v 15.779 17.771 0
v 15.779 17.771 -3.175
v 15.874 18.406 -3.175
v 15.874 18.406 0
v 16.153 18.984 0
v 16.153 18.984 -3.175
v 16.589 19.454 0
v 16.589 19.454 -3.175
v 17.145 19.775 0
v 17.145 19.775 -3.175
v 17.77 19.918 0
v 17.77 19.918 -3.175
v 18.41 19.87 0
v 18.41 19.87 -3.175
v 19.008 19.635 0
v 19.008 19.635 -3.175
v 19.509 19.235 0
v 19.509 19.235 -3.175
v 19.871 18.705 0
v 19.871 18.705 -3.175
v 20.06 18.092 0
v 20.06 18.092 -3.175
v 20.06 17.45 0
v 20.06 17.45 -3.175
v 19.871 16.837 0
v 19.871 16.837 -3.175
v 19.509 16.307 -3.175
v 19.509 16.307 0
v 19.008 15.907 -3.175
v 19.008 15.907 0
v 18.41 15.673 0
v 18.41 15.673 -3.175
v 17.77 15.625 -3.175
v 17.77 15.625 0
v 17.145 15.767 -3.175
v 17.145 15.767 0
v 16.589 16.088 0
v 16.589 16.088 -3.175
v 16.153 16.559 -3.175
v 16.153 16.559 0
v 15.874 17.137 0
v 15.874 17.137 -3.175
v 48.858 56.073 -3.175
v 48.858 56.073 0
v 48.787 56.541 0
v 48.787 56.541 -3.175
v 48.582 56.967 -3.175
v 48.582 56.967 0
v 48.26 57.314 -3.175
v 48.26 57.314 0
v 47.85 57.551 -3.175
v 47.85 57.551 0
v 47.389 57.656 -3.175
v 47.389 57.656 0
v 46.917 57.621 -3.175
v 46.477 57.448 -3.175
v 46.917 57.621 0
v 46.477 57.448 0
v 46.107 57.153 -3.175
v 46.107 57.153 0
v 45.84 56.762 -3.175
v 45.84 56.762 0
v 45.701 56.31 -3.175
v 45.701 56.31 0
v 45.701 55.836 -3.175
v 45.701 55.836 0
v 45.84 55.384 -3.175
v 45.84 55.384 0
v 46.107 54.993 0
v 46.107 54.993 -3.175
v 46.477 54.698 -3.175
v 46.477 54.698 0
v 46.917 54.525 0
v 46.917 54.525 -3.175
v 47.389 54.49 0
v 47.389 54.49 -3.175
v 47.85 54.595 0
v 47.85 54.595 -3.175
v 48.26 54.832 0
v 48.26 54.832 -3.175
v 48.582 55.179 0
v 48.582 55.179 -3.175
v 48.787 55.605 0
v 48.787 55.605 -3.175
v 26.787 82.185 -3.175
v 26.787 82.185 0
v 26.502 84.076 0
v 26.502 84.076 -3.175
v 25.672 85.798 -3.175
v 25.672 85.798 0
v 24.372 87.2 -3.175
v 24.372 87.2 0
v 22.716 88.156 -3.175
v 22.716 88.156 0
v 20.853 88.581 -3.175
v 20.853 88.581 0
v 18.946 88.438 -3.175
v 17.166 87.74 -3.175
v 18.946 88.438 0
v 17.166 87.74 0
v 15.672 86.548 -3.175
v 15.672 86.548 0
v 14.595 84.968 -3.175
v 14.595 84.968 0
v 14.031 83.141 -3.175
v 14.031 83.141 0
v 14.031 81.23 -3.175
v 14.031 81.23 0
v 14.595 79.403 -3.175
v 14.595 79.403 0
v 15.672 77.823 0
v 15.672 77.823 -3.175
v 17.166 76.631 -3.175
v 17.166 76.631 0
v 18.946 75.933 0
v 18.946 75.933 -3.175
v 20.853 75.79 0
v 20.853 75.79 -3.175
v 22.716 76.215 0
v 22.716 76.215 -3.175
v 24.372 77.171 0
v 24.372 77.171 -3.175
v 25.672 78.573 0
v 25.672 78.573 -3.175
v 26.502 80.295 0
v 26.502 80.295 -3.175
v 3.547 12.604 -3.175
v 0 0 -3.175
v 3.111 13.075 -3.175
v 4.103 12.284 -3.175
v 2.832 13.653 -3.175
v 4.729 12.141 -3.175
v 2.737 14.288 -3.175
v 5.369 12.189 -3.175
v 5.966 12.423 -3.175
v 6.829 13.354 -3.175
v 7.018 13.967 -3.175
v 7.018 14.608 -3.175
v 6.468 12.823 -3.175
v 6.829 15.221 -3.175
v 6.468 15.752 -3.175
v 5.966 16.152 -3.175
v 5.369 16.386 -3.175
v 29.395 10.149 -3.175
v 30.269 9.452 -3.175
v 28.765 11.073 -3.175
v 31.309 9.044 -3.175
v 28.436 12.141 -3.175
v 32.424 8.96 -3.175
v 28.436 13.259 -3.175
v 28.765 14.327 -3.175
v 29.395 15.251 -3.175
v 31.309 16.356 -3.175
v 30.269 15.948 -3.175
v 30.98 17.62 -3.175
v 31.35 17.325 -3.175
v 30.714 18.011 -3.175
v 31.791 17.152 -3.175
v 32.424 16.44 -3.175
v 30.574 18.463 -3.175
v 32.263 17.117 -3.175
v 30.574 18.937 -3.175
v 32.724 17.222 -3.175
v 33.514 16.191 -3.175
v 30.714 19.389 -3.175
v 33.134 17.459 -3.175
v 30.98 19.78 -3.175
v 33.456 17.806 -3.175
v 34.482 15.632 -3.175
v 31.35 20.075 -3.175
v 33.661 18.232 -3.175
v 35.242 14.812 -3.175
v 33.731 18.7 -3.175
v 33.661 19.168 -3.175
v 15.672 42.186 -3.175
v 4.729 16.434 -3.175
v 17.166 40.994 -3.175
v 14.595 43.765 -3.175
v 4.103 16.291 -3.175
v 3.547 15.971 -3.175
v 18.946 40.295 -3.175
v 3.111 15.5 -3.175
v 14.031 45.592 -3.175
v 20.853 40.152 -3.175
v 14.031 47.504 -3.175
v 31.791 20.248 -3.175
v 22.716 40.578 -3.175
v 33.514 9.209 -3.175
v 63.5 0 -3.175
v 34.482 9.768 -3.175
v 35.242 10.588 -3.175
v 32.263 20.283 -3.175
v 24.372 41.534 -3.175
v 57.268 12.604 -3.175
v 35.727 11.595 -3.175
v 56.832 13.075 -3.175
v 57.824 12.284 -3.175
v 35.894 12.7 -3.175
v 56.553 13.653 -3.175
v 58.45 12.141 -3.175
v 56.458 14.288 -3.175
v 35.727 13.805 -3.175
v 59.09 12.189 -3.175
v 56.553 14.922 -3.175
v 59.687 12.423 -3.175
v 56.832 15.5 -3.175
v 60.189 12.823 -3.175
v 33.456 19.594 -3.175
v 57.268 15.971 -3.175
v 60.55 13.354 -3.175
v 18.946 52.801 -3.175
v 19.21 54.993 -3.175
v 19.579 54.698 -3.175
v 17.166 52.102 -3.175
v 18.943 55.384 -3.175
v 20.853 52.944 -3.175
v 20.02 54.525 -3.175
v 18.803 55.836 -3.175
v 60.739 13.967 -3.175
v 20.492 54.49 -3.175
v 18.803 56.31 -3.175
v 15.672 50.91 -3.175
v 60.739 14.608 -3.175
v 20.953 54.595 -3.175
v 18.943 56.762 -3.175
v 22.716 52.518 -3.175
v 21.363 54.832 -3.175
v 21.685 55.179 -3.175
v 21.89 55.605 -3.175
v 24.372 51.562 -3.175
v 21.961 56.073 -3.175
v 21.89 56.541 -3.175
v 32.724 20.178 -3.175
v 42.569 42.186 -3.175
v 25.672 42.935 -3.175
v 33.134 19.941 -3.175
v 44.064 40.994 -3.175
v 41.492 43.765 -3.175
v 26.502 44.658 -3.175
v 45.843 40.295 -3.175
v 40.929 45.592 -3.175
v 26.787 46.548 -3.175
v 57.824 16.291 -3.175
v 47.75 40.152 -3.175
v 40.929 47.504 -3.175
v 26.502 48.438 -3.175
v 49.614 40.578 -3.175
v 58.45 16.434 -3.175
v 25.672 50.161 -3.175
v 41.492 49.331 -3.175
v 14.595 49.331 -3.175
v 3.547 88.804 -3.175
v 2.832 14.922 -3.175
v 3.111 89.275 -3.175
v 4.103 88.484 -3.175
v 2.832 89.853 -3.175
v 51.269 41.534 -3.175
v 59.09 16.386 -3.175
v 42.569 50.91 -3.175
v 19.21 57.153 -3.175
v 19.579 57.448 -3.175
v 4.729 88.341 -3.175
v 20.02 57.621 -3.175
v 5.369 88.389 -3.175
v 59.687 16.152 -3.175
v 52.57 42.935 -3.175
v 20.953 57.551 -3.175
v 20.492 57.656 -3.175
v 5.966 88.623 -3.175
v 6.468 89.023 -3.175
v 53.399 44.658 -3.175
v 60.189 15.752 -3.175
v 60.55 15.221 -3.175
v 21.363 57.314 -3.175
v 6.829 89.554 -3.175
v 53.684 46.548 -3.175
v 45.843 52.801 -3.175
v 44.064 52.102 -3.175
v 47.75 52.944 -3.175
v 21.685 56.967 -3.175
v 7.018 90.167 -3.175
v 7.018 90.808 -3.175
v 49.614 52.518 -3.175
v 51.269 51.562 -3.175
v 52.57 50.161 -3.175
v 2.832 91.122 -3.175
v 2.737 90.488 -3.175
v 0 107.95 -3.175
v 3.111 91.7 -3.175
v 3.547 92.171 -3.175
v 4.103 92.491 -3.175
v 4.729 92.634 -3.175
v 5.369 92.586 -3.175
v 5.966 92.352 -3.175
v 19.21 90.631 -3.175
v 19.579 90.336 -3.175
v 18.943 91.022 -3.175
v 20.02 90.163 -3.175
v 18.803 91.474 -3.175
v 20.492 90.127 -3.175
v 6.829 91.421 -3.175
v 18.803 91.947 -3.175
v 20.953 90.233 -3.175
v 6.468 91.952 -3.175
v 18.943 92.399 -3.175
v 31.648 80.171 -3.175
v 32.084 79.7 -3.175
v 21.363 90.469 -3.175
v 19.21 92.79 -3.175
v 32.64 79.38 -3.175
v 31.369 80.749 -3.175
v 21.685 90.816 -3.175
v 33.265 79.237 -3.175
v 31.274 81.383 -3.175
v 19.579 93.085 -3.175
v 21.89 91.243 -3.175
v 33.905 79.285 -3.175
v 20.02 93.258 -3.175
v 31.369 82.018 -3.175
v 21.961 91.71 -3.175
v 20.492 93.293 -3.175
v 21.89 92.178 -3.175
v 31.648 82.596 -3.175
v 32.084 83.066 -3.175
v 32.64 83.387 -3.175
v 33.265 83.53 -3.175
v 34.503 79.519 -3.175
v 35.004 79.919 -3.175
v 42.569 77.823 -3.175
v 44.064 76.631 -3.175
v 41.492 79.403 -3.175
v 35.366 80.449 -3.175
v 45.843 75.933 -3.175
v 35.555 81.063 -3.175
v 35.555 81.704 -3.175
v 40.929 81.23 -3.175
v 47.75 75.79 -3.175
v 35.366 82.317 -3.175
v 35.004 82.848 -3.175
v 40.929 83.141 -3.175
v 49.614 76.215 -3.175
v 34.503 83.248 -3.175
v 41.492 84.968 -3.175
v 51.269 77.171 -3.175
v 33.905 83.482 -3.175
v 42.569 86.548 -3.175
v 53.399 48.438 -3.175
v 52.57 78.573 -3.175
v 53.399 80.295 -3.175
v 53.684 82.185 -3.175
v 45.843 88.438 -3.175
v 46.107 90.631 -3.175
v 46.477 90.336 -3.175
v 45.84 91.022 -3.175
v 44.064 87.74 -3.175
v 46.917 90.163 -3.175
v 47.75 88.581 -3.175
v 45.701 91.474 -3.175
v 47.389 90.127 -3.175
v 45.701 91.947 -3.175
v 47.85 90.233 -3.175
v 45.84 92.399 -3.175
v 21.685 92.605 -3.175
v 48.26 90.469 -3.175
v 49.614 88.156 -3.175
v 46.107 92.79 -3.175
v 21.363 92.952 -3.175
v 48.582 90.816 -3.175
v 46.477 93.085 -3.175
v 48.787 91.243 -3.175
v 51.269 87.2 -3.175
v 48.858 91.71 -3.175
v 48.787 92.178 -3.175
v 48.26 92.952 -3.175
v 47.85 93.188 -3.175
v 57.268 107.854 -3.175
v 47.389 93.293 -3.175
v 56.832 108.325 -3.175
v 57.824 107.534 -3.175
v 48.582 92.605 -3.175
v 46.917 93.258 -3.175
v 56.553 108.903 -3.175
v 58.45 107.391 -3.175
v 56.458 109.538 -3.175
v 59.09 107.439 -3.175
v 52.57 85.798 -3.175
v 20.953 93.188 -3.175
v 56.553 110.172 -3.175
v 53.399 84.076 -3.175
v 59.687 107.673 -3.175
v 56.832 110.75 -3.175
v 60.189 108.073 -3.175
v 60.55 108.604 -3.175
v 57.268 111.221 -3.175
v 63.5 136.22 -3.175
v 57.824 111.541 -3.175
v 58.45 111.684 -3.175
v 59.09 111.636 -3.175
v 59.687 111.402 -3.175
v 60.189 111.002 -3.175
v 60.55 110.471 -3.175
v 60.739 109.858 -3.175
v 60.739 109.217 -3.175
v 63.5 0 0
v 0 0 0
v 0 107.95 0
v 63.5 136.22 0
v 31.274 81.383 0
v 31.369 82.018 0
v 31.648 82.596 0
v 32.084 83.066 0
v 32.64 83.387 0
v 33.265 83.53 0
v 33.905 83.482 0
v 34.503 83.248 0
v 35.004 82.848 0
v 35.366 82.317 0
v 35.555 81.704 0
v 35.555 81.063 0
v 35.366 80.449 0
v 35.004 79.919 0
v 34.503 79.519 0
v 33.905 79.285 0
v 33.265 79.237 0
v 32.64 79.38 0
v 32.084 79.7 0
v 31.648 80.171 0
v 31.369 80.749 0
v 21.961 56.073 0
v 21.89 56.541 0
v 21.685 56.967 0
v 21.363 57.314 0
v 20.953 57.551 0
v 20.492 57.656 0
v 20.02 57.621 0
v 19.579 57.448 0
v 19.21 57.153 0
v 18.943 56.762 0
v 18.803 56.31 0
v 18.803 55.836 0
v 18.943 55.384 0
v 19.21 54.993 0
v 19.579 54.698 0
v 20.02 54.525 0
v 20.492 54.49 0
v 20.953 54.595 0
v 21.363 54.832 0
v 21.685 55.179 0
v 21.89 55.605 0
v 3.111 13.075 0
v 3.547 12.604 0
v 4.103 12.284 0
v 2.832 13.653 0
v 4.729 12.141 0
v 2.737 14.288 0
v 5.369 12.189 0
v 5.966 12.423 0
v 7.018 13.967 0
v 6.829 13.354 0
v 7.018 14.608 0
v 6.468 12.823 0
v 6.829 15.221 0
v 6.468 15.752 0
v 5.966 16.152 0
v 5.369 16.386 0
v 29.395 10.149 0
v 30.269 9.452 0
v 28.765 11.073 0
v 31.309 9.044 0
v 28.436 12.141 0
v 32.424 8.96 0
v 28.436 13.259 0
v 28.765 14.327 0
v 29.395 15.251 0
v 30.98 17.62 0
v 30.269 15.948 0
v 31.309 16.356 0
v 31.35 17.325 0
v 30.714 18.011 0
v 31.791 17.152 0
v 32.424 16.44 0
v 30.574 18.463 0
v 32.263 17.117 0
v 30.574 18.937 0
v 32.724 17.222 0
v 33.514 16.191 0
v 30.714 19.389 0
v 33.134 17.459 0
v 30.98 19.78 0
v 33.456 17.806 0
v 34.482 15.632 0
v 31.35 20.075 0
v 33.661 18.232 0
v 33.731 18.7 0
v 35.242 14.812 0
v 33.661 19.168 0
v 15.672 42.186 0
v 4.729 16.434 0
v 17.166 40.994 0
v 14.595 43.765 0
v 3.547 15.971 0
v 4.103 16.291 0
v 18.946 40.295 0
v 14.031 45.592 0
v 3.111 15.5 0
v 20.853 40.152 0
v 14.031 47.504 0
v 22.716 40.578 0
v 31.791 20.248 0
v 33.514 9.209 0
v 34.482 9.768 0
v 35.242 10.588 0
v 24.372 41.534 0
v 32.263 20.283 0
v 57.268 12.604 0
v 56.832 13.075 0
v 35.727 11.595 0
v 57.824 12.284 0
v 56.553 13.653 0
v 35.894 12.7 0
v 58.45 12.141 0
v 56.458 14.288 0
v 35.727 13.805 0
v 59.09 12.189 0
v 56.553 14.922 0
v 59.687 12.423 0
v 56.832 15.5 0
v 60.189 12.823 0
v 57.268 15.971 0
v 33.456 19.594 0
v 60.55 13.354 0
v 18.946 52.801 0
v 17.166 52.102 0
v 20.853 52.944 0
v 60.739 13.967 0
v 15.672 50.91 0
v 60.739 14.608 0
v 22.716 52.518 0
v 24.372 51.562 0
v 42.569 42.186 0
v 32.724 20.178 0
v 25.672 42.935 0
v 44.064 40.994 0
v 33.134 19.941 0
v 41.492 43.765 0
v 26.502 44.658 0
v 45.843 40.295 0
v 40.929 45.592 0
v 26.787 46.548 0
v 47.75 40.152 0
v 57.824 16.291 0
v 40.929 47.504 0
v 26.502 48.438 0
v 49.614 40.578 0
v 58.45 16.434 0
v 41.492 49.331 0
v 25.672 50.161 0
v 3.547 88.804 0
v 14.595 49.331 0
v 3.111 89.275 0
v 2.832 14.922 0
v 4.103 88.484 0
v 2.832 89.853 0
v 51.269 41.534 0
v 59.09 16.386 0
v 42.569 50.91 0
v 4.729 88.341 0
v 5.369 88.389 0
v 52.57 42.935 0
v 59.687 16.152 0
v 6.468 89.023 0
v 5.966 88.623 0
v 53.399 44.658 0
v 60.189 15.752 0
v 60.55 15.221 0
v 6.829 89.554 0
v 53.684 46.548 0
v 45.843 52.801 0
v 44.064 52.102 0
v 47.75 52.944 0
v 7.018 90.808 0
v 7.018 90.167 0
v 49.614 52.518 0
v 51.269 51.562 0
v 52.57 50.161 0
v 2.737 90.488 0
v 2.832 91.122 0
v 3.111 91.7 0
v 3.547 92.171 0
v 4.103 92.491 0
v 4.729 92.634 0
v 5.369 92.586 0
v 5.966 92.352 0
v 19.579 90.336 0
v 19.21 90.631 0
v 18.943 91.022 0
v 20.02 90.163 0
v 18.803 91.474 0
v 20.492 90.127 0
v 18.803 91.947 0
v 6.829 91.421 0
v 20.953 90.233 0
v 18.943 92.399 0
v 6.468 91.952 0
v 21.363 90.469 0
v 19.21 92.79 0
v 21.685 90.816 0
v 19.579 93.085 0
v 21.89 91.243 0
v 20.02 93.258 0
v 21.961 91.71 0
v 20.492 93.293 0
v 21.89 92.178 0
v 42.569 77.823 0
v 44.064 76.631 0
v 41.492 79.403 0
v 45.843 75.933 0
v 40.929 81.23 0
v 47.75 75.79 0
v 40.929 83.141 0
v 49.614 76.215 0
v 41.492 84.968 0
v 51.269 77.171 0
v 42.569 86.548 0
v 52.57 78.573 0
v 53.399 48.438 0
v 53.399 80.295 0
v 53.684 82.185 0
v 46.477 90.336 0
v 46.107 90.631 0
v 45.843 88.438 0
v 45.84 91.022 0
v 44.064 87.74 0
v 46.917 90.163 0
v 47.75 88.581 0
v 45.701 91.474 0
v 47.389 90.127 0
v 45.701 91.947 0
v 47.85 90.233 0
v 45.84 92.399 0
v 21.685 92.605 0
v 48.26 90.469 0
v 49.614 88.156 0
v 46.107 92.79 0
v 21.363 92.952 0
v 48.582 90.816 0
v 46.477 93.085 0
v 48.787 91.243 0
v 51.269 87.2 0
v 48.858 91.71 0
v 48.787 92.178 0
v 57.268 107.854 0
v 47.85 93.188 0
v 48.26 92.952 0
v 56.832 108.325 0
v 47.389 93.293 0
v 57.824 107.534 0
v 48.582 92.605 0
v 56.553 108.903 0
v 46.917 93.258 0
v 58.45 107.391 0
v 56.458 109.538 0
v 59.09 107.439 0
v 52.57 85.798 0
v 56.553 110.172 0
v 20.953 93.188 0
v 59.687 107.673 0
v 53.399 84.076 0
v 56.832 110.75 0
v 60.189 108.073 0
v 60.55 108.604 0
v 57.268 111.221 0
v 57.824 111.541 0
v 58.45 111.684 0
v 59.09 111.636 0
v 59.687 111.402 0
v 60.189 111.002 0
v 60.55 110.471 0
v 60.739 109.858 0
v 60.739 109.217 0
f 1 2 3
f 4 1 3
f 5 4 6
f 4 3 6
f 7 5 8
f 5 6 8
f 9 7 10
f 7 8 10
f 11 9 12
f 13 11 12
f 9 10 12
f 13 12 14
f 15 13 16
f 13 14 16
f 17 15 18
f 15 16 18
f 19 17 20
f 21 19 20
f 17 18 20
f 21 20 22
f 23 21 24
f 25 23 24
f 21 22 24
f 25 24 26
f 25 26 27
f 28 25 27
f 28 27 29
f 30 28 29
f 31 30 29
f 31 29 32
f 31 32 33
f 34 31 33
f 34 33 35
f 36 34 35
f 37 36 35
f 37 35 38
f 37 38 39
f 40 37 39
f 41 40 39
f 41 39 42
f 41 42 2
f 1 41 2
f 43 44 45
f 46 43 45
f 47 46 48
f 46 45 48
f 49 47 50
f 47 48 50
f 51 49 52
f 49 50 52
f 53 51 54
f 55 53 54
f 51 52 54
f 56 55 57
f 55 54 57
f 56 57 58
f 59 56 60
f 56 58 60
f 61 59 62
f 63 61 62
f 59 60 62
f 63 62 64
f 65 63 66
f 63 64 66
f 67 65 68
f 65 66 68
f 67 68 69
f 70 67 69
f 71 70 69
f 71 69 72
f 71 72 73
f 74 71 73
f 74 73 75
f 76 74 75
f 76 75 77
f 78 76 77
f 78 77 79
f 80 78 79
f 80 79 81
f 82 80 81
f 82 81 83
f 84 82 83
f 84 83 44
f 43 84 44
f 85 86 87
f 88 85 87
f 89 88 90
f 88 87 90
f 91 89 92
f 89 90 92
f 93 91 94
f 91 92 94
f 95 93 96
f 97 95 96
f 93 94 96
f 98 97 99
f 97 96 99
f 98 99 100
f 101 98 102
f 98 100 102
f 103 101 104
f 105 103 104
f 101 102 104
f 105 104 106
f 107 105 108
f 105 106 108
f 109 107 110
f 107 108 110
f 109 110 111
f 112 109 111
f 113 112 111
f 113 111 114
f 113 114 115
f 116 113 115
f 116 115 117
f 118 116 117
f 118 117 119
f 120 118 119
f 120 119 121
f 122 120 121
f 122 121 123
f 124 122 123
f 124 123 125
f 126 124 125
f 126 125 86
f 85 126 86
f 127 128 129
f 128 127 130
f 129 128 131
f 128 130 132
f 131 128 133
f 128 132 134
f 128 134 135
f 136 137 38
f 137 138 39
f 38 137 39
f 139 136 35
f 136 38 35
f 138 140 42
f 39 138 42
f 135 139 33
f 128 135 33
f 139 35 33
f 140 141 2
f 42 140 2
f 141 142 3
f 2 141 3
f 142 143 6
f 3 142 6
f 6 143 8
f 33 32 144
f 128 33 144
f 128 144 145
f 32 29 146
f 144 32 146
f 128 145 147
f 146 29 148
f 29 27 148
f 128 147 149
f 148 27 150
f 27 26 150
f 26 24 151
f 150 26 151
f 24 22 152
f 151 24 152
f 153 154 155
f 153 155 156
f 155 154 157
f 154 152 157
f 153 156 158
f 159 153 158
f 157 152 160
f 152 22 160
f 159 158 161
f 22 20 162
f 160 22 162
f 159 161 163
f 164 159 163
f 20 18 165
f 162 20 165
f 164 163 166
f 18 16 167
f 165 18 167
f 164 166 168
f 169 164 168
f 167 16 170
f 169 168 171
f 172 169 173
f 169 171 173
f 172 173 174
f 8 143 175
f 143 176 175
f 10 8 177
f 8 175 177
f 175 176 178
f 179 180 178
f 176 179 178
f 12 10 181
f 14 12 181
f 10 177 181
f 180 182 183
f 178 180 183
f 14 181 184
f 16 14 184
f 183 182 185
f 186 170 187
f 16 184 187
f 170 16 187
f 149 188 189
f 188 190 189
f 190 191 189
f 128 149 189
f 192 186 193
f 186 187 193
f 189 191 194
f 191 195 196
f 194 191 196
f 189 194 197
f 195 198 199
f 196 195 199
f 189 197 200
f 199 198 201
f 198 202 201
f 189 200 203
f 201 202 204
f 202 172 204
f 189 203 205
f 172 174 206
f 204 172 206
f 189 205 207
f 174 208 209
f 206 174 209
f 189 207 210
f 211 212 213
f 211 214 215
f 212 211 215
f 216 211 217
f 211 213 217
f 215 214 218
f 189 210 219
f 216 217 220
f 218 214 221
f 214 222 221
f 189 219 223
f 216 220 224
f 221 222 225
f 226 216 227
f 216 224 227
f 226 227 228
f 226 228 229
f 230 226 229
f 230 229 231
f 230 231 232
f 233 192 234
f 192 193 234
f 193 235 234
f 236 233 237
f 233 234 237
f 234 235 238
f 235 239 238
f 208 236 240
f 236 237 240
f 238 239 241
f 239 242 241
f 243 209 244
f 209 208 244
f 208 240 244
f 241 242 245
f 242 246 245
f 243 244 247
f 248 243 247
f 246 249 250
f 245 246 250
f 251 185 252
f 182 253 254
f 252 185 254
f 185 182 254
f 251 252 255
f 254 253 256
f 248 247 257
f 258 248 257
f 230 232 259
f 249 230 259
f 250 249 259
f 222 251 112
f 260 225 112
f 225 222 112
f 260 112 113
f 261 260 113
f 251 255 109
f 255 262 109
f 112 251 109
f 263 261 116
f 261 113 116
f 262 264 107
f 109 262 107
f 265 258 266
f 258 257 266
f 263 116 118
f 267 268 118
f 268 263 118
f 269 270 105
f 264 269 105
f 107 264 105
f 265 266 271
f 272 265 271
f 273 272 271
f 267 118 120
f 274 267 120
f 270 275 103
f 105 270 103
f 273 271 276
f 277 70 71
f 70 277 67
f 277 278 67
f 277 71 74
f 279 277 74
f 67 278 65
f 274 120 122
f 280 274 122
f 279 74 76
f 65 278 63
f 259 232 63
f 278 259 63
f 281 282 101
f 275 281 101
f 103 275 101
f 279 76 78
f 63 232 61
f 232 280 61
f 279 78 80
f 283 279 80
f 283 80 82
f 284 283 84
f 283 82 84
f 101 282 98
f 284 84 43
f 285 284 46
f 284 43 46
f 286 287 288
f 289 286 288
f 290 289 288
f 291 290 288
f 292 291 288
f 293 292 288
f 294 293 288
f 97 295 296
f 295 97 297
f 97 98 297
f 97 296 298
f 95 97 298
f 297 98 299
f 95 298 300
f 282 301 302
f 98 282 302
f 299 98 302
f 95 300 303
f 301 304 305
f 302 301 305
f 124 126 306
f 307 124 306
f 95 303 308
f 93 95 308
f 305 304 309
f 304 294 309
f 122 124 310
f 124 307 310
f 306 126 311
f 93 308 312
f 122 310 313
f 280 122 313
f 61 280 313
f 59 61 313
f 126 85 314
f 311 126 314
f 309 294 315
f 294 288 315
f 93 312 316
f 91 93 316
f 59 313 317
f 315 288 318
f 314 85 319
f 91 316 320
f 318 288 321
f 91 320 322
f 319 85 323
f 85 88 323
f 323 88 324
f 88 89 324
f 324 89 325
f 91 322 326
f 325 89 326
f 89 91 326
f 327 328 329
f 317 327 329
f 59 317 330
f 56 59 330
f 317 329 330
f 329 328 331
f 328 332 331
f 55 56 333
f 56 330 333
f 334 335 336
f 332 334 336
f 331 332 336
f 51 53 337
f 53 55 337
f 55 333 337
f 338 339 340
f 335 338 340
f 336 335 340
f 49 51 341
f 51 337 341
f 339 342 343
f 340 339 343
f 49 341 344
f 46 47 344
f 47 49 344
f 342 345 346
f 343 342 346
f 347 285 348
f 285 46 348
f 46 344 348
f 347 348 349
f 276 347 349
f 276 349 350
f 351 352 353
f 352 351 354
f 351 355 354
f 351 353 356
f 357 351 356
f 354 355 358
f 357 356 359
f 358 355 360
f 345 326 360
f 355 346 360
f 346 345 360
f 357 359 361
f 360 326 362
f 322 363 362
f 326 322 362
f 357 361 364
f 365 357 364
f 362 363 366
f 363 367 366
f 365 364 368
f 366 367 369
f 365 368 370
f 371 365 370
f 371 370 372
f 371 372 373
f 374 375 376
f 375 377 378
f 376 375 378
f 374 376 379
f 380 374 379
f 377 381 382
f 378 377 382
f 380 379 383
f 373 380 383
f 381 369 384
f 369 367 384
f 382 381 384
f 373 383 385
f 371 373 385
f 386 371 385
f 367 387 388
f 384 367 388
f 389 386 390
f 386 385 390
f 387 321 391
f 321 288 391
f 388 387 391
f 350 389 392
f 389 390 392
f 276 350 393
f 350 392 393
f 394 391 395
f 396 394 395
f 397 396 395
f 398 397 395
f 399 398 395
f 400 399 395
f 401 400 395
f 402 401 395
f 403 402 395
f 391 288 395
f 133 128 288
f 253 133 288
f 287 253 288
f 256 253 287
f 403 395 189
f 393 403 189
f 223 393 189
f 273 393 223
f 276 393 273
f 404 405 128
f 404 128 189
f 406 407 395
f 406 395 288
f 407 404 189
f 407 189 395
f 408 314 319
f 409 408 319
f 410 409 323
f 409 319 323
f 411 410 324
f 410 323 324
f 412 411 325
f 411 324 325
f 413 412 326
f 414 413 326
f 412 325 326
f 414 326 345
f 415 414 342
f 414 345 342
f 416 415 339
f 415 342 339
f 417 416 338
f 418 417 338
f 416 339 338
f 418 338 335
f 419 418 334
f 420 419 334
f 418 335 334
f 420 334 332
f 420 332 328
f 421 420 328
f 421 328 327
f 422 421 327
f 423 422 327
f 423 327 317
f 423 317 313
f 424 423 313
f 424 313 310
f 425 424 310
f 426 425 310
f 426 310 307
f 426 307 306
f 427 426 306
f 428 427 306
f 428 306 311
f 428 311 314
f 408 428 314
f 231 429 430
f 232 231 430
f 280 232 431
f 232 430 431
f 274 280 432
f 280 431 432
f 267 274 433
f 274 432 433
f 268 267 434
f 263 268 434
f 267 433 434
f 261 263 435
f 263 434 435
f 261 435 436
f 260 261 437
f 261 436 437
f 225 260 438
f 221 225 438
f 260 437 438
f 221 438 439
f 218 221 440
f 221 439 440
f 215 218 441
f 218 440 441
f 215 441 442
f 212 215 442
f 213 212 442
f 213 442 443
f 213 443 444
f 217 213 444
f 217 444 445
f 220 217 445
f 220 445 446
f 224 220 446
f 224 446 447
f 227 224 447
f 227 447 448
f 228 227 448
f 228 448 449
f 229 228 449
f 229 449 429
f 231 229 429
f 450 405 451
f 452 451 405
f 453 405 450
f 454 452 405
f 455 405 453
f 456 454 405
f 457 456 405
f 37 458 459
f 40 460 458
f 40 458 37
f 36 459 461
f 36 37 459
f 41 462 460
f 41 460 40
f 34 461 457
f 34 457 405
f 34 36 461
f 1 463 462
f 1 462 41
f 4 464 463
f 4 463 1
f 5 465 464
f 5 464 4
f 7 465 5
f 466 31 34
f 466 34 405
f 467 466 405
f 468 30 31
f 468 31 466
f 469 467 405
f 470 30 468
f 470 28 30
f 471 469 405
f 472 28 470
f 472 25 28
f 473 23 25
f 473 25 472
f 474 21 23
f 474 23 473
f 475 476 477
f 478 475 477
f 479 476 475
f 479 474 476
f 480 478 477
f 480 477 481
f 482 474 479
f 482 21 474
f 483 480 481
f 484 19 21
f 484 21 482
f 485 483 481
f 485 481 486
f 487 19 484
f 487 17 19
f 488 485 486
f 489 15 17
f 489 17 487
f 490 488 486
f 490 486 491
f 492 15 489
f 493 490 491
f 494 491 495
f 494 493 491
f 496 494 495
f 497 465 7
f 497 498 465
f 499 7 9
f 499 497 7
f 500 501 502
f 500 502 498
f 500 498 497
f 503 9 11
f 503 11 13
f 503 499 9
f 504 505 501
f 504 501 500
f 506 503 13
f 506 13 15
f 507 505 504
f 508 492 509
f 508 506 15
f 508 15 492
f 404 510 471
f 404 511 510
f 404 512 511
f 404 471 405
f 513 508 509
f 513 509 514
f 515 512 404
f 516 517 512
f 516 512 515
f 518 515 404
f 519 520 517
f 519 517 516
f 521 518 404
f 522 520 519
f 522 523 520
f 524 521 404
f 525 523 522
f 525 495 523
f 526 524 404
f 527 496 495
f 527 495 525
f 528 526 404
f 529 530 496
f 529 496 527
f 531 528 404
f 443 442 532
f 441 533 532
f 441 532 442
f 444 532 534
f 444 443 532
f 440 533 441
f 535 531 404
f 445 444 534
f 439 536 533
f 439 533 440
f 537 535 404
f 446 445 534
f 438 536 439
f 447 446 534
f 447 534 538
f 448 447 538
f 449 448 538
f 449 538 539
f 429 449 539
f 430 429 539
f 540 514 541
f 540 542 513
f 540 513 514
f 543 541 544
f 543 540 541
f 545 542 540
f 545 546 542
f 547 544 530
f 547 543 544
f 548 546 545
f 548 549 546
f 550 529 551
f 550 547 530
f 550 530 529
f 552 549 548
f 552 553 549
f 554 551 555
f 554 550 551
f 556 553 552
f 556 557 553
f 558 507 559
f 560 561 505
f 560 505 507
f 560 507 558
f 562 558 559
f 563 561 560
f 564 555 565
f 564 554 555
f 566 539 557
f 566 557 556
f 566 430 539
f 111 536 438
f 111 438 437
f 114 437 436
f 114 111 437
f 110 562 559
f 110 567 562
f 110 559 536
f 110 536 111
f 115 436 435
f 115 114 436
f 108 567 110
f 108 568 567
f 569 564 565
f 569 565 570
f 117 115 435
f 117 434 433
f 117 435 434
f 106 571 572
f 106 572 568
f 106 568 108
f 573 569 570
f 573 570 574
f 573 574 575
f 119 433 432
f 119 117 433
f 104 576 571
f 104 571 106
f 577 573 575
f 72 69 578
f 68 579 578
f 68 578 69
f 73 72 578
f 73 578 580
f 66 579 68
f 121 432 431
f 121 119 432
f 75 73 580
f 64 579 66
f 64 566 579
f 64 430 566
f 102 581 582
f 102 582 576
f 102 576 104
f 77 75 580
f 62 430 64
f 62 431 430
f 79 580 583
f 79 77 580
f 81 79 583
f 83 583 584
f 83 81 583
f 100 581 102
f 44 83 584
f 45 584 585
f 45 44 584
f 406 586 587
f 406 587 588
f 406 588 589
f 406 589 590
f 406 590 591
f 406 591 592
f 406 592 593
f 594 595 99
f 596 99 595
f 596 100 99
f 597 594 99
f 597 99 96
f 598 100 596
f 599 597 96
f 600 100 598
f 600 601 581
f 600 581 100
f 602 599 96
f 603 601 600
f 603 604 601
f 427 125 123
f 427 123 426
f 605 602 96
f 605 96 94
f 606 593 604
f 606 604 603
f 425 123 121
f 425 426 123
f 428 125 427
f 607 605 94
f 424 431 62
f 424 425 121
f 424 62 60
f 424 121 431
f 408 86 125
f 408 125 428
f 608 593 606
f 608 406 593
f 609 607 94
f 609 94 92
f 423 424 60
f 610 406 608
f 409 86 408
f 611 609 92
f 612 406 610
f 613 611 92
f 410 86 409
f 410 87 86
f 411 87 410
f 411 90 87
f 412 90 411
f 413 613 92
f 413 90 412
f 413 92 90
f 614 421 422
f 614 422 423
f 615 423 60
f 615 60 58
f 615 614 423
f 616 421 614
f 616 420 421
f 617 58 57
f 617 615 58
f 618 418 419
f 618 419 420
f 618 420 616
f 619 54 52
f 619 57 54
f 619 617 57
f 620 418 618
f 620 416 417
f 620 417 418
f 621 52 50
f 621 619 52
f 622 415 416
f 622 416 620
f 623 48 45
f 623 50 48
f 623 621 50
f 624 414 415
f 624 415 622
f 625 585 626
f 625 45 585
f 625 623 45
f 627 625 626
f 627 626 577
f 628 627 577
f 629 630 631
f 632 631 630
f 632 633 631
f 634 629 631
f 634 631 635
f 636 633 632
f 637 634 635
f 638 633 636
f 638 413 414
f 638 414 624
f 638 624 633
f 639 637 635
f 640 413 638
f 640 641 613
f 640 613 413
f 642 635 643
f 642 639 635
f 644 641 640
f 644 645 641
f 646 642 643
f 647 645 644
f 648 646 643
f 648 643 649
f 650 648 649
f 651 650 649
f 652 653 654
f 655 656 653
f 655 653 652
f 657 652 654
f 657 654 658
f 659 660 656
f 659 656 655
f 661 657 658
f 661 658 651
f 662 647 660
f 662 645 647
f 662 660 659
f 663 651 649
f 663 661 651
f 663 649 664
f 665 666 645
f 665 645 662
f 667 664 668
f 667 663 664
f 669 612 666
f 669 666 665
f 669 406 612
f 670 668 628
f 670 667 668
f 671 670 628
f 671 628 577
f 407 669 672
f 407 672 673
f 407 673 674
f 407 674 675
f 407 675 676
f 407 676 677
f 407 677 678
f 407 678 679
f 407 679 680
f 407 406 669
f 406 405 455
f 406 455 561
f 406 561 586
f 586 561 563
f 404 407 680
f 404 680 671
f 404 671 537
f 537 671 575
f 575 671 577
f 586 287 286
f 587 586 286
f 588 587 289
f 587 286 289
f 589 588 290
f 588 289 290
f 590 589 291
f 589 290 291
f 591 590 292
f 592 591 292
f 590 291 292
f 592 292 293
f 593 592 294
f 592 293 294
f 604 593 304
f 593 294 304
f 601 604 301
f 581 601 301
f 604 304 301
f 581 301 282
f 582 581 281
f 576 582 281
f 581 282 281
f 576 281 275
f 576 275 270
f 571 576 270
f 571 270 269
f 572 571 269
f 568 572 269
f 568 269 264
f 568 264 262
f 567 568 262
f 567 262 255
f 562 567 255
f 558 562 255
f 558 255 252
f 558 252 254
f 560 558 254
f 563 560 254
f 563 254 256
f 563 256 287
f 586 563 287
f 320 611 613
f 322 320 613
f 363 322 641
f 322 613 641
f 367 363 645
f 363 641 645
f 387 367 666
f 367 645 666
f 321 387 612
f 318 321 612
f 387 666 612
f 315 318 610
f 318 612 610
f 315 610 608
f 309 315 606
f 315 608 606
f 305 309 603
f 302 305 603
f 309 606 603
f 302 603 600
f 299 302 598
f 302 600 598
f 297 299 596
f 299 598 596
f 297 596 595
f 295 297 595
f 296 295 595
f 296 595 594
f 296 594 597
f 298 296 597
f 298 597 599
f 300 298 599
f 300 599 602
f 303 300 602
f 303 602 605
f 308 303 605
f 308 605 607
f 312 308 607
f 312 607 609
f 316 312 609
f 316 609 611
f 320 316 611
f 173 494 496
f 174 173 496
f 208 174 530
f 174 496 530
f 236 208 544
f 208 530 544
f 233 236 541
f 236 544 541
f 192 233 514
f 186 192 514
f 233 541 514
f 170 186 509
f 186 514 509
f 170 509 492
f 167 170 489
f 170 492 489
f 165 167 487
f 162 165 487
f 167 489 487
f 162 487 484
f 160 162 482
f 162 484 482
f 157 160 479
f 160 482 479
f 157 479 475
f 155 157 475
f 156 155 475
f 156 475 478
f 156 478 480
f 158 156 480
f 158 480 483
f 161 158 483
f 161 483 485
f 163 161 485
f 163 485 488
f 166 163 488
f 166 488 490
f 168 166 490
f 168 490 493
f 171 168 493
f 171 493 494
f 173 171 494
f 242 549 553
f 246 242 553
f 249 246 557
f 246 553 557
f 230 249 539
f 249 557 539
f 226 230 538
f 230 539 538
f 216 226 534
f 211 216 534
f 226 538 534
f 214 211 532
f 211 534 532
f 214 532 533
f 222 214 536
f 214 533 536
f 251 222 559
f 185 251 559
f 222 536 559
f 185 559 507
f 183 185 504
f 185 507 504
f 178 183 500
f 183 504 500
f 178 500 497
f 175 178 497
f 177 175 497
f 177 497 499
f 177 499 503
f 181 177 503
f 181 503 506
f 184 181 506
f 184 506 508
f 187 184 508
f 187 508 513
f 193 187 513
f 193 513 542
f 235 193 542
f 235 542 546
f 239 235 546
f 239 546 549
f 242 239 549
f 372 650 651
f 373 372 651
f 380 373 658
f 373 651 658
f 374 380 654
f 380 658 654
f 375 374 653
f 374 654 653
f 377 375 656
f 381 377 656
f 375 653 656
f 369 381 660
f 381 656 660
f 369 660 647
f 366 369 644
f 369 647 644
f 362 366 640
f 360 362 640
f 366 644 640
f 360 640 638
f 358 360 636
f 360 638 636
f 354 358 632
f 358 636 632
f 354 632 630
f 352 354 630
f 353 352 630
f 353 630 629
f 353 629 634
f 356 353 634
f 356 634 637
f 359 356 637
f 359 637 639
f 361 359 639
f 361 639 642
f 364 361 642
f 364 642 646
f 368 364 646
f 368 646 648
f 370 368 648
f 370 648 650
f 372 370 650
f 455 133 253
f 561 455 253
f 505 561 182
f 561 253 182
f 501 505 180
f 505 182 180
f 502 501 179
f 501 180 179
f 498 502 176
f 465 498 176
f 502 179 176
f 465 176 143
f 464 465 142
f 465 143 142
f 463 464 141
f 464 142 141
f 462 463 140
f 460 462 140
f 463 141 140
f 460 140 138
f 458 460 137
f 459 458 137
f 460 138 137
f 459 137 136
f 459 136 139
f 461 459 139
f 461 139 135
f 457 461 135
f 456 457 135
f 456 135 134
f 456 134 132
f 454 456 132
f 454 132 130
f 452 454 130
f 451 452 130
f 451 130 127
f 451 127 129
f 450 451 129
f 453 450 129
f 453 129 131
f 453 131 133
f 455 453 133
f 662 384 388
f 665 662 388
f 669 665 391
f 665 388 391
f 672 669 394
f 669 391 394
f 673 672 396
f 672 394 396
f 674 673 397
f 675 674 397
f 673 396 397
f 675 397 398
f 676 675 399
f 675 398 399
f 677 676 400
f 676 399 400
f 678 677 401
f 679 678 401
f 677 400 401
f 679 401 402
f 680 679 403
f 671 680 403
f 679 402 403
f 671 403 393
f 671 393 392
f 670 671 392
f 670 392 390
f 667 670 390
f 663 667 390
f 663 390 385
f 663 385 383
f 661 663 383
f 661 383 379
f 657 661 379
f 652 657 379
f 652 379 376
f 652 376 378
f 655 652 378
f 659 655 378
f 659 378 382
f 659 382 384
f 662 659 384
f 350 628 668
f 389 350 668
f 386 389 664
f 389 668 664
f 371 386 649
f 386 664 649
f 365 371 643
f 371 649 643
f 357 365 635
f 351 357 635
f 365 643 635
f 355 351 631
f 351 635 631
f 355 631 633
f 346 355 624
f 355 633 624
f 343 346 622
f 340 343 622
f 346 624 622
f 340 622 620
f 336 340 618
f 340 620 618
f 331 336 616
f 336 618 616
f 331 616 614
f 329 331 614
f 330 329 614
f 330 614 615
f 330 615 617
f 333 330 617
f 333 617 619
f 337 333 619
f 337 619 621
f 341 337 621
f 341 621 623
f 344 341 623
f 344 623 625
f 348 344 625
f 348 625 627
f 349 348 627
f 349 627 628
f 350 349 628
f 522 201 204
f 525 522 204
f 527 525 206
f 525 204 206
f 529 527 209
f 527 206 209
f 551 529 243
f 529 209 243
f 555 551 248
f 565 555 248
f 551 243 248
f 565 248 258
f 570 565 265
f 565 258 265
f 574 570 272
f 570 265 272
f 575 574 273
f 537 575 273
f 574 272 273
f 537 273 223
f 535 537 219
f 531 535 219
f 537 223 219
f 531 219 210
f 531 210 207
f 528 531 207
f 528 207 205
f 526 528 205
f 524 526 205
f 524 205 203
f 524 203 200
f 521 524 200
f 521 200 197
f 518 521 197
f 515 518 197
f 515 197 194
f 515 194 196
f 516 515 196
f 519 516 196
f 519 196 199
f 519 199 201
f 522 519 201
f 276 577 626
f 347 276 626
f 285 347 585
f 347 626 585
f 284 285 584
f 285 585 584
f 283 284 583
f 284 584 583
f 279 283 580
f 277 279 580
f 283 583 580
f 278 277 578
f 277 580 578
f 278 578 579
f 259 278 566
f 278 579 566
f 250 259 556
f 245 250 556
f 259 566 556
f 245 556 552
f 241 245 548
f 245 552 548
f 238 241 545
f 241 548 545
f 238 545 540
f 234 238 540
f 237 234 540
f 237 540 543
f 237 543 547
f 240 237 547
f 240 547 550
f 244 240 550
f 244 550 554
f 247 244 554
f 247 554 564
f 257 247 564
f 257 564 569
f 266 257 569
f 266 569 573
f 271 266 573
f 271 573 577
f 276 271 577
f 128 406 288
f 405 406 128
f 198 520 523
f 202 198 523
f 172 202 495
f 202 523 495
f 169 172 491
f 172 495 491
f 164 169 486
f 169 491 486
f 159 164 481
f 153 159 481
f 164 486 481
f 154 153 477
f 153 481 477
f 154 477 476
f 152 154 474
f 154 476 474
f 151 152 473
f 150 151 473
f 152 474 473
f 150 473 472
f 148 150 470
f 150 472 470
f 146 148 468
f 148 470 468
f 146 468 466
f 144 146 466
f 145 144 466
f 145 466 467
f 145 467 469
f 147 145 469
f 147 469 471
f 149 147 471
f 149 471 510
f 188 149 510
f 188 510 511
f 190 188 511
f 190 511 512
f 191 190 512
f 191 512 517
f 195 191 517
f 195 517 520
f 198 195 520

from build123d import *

# Parameters (mm, degrees)
BOSS_EXTRUDE1_DEPTH   = 3.175
F_6_CLEARANCE_HOLE1_D = 4.3053
SKETCH8_R             = 1.5875
SKETCH8_R_2           = 3.75
SKETCH8_R_3           = 6.4135
CUT_EXTRUDE1_DEPTH    = 4.175
F_6_CLEARANCE_HOLE2_D = 4.3053


with BuildPart() as part:
    # Sketch1 → Boss-Extrude1 (new body)
    with BuildSketch(Plane.XY):
        Polygon((0, 107.95), (0, 0), (63.5, 0), (63.5, 136.2202), align=None)
    extrude(amount=-BOSS_EXTRUDE1_DEPTH)

    # #6 Clearance Hole1 (through all)
    with Locations(Plane.XY):
        with Locations((58.6105, 14.2875), (4.8895, 14.2875), (4.8895, 90.4875), (58.6105, 109.5375)):
            Hole(F_6_CLEARANCE_HOLE1_D / 2)

    # Sketch8 → Cut-Extrude1 (cut, through all)
    with BuildSketch(Plane.XY):
        with Locations((20.373230618, 91.71042385)):
            Circle(SKETCH8_R)
        with Locations((47.270485986, 91.71042385)):
            Circle(SKETCH8_R)
        with Locations((47.270485986, 56.073006151)):
            Circle(SKETCH8_R)
        with Locations((32.1439032, 12.7)):
            Circle(SKETCH8_R_2)
        with Locations((20.373230618, 56.073006151)):
            Circle(SKETCH8_R)
        with Locations((32.1439032, 18.7)):
            Circle(SKETCH8_R)
        with Locations((47.270485986, 46.548006151)):
            Circle(SKETCH8_R_3)
        with Locations((47.270485986, 82.18542385)):
            Circle(SKETCH8_R_3)
        with Locations((20.373230618, 82.18542385)):
            Circle(SKETCH8_R_3)
        with Locations((20.373230618, 46.548006151)):
            Circle(SKETCH8_R_3)
    extrude(amount=-CUT_EXTRUDE1_DEPTH, mode=Mode.SUBTRACT)

    # #6 Clearance Hole2 (through all)
    with Locations(Plane(origin=(31.75, 0, 6.35), x_dir=(1, 0, 0), z_dir=(0, 0, 1))):
        with Locations((1.676331213, 81.383391323), (-13.818696068, 17.771227958)):
            Hole(F_6_CLEARANCE_HOLE2_D / 2)


solid = part.part
